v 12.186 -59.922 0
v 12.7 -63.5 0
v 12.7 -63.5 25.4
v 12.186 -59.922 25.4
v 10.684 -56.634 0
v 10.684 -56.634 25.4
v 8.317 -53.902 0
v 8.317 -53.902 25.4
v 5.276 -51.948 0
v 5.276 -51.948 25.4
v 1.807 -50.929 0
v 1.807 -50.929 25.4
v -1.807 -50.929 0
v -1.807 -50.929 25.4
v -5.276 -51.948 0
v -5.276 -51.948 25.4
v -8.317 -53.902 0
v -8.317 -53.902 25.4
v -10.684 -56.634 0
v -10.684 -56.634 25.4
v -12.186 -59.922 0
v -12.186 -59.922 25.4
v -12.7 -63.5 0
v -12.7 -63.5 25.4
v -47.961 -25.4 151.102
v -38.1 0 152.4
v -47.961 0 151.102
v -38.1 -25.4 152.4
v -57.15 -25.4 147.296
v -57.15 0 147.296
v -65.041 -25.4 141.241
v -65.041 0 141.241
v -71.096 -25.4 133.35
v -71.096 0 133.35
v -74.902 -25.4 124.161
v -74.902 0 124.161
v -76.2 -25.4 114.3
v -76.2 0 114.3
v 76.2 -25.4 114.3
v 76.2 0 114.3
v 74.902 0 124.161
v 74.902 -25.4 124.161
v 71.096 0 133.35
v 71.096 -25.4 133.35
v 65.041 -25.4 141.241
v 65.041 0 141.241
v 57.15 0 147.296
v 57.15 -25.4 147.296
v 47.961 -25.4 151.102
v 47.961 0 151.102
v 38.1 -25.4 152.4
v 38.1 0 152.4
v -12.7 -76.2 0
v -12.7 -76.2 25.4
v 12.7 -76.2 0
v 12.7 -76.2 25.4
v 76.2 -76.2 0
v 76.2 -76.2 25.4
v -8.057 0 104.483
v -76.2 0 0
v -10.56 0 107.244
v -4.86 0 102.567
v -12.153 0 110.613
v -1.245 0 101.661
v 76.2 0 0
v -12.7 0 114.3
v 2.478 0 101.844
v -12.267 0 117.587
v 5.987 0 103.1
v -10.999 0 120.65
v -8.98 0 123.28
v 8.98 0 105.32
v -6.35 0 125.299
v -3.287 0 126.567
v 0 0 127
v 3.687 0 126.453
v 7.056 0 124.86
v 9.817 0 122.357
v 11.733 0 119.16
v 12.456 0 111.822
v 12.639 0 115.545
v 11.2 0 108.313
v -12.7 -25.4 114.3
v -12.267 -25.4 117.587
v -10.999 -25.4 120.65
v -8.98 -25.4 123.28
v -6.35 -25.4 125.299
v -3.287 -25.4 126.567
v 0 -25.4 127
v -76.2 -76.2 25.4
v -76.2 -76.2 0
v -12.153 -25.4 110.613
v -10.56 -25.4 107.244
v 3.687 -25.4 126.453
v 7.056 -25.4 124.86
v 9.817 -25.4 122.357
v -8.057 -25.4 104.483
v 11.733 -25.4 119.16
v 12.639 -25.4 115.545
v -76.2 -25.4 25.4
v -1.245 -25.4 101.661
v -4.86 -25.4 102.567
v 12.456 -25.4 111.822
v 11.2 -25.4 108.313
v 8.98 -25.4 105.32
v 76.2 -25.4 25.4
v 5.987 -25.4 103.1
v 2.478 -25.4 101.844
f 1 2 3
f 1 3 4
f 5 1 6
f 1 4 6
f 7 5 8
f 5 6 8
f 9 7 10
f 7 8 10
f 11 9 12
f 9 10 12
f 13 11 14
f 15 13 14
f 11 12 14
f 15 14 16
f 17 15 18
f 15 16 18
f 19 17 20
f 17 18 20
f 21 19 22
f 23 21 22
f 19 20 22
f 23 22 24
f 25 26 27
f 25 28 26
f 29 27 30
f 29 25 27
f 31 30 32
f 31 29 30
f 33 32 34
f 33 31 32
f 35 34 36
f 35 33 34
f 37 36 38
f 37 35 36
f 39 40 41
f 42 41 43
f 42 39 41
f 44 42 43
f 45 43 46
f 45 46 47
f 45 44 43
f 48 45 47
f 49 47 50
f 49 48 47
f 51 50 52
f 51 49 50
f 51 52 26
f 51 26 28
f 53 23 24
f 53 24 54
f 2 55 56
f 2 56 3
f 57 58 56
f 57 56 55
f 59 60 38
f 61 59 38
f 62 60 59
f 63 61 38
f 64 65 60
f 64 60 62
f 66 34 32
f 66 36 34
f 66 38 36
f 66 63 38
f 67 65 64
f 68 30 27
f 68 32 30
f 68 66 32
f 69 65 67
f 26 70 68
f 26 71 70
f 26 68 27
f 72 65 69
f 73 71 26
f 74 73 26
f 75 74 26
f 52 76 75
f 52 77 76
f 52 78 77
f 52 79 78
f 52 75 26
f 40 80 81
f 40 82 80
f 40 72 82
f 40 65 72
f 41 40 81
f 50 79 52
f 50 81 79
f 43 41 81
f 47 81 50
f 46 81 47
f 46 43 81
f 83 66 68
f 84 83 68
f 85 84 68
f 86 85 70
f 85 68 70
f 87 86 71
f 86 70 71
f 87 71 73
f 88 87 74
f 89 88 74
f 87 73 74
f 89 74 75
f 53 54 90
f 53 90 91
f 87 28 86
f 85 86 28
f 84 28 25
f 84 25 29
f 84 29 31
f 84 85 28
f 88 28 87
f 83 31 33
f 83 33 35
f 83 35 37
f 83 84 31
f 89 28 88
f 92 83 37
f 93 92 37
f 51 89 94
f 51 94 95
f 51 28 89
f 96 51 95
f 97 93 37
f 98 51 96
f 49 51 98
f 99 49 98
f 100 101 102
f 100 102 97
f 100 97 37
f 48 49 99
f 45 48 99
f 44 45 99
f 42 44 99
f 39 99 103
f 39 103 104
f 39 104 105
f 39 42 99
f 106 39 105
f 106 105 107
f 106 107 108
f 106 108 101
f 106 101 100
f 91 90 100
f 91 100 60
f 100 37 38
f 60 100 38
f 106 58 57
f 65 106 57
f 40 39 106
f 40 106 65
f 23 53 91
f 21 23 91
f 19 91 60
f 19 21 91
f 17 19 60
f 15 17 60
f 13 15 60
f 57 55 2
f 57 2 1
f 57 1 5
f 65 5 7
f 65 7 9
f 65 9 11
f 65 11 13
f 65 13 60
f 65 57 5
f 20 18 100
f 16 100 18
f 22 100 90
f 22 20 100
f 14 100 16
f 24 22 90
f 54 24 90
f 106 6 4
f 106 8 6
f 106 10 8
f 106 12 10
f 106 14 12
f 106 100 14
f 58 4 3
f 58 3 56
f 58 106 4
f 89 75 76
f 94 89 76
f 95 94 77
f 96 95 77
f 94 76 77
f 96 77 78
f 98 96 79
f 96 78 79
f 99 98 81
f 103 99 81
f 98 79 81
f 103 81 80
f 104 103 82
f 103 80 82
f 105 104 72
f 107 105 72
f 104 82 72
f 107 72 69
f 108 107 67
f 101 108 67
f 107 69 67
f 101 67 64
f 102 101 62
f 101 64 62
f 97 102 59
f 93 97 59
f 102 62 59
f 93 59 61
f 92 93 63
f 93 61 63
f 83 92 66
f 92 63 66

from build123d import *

# Parameters (mm, degrees)
F1_DEPTH = 76.2
F3_DEPTH = 25.4
F5_DEPTH = 45.466
F6_R     = 38.1
F7_R     = 38.1


with BuildPart() as f1:
    # F0 (on Right) → F1 (new body, symmetric)
    with BuildSketch(Plane.YZ):
        Polygon((-76.2, 0), (0, 0), (0, 152.4), (-25.4, 152.4), (-25.4, 25.4), (-76.2, 25.4), align=None)
    extrude(amount=F1_DEPTH, both=True)

    # F2 (on face) → F3 (cut)
    with BuildSketch(Plane(origin=(0, 0, 0), x_dir=(-1, 0, 0), z_dir=(0, 1, 0))):
        with BuildLine():
            ThreePointArc((0, 127), (-8.980256, 105.319744), (12.7, 114.3))
            ThreePointArc((12.7, 114.3), (8.980256, 123.280256), (0, 127))
        make_face()
    extrude(amount=-F3_DEPTH, mode=Mode.SUBTRACT)

    # F4 (on face) → F5 (cut)
    with BuildSketch(Plane.XY.offset(25.4)):
        with BuildLine():
            Line((12.7, -76.2), (12.7, -63.5))
            ThreePointArc((12.7, -63.5), (0, -50.8), (-12.7, -63.5))
            Line((-12.7, -63.5), (-12.7, -76.2))
            Line((-12.7, -76.2), (12.7, -76.2))
        make_face()
    extrude(amount=-F5_DEPTH, mode=Mode.SUBTRACT)

    # F6
    f6_edges = [f1.edges().sort_by_distance(p)[0] for p in [
        (76.2, -12.7, 152.4),
    ]]
    fillet(f6_edges, radius=F6_R)

    # F7
    f7_edges = [f1.edges().sort_by_distance(p)[0] for p in [
        (-76.2, -12.7, 152.4),
    ]]
    fillet(f7_edges, radius=F7_R)


solid = f1.part
